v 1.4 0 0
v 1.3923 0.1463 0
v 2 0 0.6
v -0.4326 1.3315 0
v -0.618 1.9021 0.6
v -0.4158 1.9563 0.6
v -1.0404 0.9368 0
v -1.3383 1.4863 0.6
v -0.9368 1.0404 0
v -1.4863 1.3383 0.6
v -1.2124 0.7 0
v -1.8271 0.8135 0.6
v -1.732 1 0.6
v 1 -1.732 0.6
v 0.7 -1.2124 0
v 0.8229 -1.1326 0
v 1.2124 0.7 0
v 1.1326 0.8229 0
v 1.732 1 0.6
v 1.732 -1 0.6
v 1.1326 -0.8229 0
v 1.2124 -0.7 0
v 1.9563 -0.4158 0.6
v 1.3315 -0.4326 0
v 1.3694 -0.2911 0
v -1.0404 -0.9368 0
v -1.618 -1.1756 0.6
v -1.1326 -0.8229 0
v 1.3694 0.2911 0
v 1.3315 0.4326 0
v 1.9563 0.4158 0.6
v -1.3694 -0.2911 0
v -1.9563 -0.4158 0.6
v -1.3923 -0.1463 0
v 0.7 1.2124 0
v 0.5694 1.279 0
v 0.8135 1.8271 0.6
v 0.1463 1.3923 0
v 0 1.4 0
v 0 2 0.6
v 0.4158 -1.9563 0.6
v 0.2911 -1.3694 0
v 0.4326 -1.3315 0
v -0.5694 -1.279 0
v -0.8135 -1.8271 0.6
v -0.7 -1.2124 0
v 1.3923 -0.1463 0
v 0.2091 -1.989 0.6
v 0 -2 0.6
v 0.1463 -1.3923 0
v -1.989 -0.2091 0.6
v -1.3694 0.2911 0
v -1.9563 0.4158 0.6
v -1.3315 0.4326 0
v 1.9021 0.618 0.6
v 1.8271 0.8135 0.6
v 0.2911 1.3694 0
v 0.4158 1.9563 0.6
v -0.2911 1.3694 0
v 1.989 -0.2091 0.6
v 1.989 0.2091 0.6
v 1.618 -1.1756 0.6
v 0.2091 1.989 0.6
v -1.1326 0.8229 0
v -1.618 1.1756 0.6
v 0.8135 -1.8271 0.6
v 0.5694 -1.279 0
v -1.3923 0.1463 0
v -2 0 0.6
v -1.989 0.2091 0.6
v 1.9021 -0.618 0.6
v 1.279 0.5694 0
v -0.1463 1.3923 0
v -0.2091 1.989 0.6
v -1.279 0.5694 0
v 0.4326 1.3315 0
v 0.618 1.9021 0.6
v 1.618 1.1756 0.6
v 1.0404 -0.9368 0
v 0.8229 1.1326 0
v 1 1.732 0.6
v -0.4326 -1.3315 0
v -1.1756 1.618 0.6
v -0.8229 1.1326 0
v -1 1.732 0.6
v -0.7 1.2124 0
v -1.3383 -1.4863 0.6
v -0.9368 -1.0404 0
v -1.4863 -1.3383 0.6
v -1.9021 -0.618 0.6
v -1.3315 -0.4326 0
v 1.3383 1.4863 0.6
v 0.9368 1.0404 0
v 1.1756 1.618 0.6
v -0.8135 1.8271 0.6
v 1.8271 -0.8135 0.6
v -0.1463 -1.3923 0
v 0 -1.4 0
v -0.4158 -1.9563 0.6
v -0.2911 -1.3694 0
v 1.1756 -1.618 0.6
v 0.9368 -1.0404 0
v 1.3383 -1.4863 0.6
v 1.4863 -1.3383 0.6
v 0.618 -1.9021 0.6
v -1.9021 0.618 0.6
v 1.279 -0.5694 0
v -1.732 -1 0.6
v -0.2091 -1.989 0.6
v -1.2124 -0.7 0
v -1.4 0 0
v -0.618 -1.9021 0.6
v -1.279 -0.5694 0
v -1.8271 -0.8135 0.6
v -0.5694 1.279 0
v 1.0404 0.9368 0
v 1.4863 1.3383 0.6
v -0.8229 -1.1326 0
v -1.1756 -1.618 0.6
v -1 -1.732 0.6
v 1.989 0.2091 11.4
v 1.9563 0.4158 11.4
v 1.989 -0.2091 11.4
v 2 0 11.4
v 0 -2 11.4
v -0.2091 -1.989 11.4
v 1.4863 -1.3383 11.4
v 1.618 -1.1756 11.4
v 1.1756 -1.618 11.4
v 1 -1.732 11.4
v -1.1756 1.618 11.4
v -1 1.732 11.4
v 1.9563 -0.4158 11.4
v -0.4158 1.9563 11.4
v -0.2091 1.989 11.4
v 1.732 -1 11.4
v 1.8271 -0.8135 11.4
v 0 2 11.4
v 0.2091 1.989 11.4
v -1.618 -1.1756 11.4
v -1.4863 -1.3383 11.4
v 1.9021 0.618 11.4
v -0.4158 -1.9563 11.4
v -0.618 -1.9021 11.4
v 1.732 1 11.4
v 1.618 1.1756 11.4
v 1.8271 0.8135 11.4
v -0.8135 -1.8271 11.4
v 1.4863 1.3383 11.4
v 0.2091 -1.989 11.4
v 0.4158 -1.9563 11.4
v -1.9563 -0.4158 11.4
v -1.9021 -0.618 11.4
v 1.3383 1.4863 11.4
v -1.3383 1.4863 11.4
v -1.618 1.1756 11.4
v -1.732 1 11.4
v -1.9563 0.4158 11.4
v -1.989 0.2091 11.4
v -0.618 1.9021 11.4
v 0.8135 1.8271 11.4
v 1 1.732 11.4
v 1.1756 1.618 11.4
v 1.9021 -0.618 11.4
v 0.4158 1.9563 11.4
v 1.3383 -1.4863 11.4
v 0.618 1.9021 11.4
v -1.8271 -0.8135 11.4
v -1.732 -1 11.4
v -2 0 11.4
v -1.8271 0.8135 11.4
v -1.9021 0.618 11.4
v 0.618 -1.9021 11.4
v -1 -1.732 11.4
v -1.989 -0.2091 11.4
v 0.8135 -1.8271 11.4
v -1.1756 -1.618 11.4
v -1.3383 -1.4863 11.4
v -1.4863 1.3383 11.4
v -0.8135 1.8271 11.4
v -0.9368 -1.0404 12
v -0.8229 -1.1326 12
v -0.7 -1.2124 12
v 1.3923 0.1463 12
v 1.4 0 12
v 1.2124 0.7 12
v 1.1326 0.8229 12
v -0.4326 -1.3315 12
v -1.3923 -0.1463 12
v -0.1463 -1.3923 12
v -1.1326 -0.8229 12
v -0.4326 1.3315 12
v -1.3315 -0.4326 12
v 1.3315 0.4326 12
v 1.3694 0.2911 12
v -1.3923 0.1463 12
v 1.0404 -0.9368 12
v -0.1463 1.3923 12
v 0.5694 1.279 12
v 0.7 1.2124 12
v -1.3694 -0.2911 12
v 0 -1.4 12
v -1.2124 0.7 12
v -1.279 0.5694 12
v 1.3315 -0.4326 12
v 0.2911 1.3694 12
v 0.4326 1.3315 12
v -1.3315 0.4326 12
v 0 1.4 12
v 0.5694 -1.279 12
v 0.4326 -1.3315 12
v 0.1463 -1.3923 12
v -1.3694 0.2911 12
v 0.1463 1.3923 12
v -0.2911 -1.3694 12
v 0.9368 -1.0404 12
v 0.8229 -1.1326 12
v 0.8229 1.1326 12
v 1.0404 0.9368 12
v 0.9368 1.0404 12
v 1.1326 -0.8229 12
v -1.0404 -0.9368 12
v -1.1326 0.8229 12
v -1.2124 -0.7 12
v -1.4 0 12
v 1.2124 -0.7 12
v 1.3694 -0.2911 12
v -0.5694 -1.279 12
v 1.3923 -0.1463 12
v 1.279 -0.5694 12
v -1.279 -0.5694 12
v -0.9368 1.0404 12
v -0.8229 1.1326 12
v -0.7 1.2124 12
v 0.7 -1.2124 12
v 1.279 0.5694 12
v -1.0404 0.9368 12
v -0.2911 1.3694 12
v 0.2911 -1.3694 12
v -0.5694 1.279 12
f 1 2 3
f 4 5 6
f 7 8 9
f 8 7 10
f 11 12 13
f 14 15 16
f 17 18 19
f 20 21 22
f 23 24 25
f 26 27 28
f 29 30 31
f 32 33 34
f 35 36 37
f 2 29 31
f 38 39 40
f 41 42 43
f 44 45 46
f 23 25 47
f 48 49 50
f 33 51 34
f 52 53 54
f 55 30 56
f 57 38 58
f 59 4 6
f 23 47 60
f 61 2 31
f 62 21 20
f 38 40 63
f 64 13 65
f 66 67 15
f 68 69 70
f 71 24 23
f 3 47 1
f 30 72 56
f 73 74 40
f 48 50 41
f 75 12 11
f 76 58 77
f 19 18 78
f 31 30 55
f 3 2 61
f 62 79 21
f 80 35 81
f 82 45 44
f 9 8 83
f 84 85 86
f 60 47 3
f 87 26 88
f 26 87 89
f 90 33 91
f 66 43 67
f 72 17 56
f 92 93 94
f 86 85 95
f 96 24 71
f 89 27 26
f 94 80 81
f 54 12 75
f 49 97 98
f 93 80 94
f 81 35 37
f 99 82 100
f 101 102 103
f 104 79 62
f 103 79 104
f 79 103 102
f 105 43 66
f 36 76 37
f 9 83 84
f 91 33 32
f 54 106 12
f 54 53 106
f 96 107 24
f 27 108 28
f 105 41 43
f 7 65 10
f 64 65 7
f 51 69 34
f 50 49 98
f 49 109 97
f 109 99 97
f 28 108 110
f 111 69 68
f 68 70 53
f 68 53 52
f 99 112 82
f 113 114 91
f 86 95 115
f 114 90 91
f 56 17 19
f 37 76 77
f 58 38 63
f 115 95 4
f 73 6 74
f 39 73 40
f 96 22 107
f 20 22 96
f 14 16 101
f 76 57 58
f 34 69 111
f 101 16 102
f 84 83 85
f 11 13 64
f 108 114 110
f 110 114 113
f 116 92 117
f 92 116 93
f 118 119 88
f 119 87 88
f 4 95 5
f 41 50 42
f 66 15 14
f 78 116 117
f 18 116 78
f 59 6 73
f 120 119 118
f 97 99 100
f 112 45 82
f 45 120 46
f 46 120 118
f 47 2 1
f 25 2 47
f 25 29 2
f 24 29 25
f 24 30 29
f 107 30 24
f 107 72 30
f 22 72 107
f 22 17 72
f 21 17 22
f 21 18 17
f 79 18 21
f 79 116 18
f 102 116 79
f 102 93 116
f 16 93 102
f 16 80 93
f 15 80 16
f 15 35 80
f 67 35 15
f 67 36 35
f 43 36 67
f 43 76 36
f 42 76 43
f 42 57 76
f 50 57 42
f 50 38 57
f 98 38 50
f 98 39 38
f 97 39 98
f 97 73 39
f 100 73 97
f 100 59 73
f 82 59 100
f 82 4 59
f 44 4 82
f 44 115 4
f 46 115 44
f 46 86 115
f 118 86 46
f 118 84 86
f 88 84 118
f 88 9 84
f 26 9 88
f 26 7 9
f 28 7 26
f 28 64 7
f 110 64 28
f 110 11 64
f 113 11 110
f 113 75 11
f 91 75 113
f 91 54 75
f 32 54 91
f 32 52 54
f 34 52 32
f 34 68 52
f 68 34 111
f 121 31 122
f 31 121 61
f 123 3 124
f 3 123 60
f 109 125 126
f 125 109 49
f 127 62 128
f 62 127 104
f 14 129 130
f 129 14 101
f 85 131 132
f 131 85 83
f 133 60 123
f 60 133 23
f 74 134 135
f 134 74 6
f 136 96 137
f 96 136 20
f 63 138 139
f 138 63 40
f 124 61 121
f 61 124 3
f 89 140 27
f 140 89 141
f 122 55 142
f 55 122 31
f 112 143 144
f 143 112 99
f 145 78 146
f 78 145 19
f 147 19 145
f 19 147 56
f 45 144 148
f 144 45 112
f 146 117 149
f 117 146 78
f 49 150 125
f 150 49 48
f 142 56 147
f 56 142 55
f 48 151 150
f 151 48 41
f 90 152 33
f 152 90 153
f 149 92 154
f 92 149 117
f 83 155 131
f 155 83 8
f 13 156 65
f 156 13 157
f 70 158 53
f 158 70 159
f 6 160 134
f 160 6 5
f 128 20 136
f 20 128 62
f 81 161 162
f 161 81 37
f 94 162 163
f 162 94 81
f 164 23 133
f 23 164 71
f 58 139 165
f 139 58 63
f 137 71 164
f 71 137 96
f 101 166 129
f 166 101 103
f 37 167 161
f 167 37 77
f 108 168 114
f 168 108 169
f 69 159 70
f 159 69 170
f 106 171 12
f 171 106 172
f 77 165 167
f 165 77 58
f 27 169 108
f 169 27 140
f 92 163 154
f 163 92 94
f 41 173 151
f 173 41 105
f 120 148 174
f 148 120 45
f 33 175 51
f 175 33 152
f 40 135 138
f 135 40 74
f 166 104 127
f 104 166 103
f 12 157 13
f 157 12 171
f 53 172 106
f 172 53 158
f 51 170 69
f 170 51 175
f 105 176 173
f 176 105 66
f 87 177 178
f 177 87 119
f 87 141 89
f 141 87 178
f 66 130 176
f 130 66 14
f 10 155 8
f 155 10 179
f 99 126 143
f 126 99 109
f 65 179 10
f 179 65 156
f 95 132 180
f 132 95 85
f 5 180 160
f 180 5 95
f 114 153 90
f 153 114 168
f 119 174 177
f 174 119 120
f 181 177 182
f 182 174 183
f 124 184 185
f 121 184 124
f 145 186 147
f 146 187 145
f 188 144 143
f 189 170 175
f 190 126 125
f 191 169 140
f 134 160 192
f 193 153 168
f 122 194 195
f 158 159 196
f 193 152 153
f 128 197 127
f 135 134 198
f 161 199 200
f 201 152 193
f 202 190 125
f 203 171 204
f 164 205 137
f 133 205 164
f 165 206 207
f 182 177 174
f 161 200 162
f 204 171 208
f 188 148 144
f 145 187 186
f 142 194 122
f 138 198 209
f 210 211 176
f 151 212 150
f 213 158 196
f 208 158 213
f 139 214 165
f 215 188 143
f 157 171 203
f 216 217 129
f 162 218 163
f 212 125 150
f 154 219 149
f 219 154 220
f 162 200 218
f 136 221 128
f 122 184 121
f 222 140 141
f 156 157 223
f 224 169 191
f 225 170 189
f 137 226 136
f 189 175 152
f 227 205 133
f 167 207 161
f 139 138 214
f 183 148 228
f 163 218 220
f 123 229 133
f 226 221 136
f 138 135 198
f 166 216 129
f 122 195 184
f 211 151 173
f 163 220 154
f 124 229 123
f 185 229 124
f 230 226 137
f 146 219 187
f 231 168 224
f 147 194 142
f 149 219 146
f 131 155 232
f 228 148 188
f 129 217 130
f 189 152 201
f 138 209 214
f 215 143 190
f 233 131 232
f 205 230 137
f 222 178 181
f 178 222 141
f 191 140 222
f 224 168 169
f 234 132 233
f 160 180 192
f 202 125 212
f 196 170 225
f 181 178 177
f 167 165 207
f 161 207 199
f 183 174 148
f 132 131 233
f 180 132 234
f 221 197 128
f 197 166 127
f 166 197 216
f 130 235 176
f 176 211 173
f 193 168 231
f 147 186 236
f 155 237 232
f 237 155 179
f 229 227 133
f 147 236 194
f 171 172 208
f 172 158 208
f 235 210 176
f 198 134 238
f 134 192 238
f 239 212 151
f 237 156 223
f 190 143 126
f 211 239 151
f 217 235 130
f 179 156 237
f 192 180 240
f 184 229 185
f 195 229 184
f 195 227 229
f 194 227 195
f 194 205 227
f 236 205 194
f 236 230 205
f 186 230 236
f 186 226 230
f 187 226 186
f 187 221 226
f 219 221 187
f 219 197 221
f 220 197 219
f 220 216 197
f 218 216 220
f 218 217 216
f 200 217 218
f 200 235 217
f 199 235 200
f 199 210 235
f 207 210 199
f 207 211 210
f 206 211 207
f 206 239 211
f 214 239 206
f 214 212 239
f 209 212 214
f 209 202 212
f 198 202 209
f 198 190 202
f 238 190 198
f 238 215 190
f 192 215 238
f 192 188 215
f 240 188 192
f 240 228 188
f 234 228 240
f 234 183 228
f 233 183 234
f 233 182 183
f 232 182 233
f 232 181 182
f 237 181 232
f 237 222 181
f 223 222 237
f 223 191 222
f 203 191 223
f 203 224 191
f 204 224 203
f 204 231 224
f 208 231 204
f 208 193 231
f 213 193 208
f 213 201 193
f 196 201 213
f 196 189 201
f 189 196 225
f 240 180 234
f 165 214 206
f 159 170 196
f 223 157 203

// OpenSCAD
// Chamfered dowel pin.
$fn = 60;
eps = 0.02;
diameter = 4;
length = 12;
chamfer = 0.6;
union() {
    cylinder(d1 = diameter - 2 * chamfer, d2 = diameter, h = chamfer);
    translate([0, 0, chamfer]) cylinder(d = diameter, h = length - 2 * chamfer);
    translate([0, 0, length - chamfer]) cylinder(d1 = diameter, d2 = diameter - 2 * chamfer, h = chamfer);
}
